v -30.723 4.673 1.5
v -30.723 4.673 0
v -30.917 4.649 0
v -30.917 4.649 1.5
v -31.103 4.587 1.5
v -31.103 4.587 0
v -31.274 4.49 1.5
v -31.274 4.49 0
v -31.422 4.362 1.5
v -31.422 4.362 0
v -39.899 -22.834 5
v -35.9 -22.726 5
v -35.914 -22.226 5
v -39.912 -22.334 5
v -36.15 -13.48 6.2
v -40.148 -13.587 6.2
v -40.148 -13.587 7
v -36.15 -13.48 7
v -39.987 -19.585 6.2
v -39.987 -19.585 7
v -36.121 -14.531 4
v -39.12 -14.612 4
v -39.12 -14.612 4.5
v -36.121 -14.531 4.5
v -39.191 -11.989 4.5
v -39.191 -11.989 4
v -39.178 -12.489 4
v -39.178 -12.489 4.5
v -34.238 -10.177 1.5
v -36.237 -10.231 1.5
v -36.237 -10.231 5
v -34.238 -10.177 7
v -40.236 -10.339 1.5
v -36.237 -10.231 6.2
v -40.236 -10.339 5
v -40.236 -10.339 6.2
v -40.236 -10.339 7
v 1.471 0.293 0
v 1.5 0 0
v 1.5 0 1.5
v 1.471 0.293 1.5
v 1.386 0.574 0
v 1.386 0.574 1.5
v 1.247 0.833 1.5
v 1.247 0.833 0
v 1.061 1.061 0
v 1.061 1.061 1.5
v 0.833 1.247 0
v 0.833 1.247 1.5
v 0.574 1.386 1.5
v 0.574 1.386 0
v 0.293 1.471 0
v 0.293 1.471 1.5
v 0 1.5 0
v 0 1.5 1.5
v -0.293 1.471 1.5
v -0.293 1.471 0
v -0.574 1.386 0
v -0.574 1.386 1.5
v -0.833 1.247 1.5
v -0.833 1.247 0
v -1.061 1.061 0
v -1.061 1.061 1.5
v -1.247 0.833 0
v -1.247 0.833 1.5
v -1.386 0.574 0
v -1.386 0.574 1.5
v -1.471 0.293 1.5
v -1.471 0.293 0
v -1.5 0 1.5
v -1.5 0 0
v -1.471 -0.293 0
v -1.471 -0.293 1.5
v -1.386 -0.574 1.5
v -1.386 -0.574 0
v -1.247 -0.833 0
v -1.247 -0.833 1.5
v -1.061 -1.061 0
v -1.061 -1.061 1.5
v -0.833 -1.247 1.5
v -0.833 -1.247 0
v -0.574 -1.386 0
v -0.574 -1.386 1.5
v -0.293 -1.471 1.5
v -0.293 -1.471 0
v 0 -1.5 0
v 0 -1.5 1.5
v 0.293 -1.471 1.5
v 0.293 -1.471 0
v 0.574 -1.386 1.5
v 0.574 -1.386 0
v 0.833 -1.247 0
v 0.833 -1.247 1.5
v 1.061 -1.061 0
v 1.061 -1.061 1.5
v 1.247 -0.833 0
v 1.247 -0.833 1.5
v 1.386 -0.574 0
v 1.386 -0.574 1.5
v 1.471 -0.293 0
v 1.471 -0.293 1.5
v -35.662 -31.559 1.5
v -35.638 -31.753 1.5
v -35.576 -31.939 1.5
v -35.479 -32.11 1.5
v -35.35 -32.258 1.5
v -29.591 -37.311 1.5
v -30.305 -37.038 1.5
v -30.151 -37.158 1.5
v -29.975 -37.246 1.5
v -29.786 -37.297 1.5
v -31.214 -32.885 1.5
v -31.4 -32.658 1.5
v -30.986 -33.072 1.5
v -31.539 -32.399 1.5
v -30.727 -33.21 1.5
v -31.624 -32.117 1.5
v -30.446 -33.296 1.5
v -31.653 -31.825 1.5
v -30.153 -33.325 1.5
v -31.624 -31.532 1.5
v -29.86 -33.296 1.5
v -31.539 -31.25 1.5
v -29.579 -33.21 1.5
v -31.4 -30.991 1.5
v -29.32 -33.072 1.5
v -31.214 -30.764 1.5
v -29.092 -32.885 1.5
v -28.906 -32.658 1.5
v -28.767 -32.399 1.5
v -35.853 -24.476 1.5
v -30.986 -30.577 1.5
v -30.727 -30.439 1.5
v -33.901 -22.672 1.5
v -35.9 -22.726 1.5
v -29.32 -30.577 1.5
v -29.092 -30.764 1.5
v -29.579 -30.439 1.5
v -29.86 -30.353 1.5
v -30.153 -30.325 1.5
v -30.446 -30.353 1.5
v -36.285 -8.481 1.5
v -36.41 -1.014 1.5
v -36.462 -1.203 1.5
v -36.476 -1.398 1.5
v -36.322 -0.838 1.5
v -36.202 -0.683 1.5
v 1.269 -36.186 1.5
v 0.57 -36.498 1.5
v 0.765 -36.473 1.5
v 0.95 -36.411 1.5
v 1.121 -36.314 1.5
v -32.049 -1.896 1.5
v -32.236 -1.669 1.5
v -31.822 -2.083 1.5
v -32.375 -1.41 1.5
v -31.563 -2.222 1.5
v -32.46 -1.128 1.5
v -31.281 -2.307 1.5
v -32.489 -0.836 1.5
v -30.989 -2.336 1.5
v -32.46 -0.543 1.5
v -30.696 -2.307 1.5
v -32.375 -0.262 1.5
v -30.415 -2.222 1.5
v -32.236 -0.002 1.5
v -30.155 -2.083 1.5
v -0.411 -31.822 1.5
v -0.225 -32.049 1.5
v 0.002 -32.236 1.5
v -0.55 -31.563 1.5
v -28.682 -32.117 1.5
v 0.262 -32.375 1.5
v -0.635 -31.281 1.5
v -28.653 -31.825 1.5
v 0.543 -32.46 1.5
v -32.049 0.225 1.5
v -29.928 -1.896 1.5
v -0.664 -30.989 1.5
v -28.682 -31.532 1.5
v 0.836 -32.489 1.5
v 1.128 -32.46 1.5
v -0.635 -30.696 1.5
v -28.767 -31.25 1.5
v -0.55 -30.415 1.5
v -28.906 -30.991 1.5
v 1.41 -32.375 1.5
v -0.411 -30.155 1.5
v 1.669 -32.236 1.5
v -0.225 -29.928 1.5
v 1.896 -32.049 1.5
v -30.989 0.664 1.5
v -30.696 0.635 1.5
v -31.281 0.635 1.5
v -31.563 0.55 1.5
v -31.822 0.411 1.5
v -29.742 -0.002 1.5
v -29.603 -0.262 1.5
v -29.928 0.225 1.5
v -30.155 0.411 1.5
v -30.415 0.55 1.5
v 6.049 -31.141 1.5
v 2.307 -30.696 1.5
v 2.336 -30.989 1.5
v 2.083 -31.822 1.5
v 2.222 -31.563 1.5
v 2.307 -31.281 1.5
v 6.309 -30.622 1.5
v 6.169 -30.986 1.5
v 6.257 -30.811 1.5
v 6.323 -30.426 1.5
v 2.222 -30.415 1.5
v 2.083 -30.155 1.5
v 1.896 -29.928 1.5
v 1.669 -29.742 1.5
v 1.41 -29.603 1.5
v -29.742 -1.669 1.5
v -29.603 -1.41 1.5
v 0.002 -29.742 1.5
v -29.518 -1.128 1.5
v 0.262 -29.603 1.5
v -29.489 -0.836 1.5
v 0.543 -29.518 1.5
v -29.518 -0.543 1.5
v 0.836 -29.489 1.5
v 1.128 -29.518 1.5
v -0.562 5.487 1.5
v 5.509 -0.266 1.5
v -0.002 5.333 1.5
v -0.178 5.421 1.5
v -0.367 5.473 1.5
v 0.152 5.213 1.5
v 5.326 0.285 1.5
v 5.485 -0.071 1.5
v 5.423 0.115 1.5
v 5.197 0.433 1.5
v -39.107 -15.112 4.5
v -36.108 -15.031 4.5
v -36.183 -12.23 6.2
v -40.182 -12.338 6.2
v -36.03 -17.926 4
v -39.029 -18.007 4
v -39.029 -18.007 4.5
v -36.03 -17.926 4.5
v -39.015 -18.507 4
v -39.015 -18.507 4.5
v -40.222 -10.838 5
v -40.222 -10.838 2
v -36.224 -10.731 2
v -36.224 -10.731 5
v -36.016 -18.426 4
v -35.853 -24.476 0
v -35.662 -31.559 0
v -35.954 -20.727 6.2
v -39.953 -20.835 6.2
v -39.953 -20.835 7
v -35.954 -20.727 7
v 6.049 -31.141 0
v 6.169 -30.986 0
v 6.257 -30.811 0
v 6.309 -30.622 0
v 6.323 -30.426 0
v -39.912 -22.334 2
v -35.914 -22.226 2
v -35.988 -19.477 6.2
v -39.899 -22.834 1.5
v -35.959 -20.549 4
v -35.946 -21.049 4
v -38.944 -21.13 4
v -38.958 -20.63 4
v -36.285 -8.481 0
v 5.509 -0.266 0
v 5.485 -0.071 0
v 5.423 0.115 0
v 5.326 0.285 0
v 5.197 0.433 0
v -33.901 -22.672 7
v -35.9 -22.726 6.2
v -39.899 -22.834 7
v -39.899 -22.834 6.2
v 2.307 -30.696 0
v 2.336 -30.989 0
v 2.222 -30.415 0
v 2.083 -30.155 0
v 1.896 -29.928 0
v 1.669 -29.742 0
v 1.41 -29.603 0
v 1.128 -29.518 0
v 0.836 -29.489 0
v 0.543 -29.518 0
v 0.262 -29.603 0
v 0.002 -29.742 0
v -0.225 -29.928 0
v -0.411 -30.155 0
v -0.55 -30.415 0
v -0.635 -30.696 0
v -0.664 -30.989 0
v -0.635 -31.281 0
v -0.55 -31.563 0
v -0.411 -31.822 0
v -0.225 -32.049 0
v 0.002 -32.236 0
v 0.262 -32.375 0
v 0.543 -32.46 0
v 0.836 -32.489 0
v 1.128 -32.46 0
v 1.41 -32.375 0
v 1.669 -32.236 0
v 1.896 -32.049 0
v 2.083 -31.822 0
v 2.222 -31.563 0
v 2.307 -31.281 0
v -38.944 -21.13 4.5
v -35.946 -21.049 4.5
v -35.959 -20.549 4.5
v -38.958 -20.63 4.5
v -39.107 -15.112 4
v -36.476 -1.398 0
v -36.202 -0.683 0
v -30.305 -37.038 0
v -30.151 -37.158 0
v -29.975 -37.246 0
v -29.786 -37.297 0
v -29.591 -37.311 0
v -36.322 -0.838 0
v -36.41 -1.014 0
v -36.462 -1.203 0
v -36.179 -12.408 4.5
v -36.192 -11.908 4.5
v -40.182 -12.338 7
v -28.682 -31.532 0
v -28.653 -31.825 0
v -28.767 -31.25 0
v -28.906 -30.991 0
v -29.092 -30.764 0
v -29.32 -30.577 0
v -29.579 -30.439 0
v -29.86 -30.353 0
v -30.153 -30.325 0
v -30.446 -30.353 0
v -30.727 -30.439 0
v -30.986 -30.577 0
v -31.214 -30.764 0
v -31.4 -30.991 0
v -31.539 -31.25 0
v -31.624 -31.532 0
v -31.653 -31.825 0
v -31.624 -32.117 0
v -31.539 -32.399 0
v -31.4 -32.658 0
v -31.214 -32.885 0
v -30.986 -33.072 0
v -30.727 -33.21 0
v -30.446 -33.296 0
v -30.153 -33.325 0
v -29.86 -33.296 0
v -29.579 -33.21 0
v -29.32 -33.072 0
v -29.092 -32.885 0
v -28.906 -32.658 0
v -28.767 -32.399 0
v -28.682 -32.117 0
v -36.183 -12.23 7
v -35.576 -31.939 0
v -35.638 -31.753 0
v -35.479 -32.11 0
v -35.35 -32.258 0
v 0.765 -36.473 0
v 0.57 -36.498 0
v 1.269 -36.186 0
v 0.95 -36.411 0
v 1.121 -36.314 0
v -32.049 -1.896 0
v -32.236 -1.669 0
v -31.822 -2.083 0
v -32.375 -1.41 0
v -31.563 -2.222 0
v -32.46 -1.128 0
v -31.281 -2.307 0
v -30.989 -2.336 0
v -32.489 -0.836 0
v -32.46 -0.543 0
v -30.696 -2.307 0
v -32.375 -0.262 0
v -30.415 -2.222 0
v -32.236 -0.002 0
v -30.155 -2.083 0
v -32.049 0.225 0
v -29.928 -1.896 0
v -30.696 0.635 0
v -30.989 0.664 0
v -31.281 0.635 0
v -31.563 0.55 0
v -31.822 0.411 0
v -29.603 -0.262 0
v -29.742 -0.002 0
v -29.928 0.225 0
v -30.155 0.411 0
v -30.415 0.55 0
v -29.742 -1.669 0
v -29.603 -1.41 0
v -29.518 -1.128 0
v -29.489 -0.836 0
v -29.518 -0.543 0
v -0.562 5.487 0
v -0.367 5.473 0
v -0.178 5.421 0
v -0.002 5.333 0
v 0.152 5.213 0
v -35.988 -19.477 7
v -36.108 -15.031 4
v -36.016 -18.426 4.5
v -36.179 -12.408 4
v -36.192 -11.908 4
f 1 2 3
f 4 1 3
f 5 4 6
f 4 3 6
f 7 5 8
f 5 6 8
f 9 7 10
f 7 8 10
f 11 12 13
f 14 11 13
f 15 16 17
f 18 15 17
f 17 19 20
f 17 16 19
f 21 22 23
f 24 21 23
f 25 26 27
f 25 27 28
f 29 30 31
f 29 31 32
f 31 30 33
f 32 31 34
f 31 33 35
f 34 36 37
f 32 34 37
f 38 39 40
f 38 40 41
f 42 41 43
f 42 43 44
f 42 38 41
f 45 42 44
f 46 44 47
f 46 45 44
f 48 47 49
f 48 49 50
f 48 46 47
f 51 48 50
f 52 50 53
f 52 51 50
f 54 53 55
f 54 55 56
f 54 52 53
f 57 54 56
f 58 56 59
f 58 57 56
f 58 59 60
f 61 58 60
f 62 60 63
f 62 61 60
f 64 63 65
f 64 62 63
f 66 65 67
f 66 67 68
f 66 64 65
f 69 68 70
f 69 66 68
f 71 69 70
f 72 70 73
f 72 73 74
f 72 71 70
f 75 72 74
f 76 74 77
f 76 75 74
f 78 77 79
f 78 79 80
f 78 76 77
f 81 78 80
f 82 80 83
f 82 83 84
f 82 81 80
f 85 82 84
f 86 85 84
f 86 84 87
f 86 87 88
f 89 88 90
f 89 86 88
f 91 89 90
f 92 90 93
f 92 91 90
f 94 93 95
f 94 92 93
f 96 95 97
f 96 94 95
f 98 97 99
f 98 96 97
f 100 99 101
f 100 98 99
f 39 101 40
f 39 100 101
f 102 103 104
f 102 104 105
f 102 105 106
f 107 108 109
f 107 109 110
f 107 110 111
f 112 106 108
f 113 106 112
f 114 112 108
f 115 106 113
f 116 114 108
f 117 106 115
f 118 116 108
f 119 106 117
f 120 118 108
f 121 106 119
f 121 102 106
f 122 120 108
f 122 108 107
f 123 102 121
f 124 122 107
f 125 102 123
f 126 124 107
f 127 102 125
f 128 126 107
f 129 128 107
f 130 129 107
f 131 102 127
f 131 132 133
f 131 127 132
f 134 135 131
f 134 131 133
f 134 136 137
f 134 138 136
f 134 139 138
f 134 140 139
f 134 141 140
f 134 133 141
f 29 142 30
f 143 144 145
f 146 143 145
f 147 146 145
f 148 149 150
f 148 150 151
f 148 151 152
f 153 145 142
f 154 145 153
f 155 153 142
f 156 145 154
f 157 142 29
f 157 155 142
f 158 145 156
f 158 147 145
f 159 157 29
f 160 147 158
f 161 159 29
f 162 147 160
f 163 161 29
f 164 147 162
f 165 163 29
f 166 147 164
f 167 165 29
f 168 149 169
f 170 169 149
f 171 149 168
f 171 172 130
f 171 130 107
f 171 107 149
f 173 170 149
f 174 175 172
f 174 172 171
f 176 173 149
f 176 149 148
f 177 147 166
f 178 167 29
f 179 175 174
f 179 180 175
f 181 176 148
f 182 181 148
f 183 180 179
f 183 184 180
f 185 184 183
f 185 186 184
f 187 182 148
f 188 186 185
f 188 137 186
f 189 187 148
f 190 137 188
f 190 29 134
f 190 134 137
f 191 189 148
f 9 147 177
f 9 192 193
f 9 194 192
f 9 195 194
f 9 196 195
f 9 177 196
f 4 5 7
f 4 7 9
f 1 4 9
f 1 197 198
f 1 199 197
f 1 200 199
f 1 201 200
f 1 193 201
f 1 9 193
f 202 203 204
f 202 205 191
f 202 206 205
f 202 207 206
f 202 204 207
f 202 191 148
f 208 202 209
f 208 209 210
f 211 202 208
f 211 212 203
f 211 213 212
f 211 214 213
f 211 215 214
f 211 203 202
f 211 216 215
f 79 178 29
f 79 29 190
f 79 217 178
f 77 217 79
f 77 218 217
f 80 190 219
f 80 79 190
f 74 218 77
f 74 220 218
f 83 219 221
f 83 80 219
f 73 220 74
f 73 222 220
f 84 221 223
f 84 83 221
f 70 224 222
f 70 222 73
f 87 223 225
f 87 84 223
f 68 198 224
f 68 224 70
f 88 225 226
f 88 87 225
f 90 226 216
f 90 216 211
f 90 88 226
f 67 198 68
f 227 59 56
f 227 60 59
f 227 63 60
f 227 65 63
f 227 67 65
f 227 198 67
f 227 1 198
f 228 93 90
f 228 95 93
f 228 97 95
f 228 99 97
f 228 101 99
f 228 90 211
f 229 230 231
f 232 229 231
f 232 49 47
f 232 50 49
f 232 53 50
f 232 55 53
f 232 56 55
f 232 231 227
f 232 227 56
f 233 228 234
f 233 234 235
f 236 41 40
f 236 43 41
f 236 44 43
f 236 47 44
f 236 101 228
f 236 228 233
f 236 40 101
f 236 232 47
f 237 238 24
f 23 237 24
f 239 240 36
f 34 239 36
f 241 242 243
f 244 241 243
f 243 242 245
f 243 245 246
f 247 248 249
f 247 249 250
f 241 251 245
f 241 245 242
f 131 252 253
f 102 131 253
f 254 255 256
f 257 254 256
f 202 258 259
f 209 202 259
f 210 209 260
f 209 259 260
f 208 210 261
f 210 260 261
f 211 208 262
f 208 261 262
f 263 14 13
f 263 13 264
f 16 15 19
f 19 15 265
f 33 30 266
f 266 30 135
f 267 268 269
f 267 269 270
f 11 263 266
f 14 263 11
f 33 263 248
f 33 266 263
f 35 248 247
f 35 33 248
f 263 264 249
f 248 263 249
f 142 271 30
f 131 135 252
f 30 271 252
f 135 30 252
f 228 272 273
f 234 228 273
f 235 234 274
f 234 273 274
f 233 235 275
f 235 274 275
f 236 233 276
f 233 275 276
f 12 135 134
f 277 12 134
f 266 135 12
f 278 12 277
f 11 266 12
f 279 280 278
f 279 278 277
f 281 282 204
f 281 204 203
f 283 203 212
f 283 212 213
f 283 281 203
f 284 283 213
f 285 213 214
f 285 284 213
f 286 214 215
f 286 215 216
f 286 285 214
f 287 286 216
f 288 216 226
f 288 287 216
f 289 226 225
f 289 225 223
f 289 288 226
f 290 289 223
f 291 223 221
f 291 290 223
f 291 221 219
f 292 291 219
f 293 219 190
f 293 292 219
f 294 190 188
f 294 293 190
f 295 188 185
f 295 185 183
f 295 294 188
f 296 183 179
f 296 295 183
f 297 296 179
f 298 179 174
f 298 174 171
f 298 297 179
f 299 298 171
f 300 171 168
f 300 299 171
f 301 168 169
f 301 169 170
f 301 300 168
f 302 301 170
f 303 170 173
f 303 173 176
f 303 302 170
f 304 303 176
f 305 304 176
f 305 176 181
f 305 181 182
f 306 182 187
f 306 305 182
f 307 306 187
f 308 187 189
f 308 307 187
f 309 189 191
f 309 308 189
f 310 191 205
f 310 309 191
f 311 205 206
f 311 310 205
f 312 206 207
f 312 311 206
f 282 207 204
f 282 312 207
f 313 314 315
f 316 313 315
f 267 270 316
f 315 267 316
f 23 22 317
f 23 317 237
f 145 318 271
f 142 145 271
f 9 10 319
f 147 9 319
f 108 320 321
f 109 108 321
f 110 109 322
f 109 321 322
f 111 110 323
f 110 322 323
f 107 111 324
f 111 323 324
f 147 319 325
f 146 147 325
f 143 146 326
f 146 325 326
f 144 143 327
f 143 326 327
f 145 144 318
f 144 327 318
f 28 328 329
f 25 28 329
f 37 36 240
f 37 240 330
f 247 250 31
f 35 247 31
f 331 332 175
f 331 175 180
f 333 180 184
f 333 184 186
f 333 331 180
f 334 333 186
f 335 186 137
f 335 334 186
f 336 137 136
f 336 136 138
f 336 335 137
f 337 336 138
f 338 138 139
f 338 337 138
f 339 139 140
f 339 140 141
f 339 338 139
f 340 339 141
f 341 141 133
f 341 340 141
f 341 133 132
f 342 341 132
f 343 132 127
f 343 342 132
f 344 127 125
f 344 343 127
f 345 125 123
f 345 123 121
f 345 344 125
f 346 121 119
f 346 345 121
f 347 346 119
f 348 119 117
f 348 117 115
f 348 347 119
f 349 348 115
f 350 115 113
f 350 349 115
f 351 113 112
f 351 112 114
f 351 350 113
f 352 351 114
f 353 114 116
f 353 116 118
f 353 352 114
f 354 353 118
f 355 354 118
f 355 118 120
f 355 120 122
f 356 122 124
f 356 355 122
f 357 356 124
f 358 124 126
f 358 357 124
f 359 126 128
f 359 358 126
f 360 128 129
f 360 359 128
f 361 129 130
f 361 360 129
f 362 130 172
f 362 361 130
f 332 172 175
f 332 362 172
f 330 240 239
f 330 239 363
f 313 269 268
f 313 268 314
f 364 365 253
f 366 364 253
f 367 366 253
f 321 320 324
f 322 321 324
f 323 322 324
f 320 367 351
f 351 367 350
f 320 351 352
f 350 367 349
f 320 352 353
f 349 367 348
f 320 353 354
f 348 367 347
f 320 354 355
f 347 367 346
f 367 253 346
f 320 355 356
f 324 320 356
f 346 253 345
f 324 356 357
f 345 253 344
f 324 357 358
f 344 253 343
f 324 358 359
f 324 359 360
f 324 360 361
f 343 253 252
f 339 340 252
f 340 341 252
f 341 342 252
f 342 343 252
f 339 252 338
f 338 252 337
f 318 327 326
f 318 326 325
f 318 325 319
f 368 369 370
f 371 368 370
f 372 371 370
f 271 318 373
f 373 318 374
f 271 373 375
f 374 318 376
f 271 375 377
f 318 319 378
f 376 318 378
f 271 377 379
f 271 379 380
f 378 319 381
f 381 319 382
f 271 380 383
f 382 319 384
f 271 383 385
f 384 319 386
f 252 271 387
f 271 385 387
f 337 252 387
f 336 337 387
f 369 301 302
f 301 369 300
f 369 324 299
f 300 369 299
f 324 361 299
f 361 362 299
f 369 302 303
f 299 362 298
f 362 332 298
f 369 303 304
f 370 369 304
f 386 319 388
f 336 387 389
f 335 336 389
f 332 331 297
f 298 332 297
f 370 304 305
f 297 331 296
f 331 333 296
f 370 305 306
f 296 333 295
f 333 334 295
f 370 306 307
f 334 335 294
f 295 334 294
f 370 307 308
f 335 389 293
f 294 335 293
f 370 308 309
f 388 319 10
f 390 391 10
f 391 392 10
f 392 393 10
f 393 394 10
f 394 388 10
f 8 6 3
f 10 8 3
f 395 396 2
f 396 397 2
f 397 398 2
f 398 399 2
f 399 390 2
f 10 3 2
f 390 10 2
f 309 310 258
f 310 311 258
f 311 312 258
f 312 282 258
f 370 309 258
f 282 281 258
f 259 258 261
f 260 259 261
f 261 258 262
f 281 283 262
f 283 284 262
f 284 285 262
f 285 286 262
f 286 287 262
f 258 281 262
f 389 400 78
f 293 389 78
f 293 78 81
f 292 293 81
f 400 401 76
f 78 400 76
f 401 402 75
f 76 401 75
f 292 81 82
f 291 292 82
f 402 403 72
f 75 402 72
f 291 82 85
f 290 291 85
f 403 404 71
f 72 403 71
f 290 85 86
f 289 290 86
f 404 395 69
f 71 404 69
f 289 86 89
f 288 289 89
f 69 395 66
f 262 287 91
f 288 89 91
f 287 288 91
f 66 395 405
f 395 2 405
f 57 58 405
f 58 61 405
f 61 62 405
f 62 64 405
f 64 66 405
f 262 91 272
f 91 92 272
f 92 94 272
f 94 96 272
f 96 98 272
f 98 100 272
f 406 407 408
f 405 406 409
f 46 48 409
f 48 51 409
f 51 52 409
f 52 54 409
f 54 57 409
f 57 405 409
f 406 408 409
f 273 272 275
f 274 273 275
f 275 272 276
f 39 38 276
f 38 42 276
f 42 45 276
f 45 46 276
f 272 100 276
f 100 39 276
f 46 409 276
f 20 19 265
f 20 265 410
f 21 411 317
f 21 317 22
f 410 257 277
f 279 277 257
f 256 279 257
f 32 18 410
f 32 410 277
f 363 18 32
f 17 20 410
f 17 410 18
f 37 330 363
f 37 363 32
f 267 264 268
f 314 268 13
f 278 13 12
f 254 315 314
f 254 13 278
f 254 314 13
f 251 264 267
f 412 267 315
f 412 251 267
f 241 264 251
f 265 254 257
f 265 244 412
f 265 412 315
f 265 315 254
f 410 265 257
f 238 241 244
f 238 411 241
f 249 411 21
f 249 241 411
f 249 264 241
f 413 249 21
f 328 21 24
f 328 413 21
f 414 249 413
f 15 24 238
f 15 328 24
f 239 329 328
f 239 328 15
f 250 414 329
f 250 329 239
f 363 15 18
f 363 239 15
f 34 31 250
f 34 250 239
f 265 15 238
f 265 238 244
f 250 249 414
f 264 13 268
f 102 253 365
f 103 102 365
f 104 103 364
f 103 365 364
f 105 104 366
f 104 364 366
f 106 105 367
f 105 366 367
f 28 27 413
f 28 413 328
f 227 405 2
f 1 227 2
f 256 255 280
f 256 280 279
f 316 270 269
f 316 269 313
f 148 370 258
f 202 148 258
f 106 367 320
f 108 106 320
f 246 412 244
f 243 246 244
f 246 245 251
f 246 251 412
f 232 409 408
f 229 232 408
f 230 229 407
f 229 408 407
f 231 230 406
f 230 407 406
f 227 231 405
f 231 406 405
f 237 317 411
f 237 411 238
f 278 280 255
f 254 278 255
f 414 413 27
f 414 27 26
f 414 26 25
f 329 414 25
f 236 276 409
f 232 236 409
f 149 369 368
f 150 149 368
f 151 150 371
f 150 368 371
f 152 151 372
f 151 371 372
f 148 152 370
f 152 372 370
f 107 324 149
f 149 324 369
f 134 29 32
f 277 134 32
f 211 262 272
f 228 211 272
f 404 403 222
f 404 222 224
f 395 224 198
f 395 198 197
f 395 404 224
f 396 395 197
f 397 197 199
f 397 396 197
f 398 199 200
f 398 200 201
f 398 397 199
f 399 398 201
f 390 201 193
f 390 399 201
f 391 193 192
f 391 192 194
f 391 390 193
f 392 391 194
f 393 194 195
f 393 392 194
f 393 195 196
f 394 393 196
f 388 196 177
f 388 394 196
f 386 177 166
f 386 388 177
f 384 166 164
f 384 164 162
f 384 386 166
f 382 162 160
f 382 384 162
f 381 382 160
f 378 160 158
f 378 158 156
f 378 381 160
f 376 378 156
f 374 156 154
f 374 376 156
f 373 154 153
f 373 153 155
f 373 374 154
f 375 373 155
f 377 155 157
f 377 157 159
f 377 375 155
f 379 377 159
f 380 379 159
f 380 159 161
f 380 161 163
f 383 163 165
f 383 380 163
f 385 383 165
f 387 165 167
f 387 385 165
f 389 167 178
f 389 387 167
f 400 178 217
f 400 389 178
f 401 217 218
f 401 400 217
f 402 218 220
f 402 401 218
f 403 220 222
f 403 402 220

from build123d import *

# Parameters (mm, degrees)
SKETCH_1_R      = 1.5
EXTRUDE_1_DEPTH = 1.5
SKETCH_2_W      = 5.5
SKETCH_2_H      = 12.5
EXTRUDE_2_DEPTH = 2
SKETCH_3_W      = 0.8
SKETCH_3_H      = 2
SKETCH_3_H_2    = 3
EXTRUDE_3_DEPTH = 4
SKETCH_4_W      = 0.5
SKETCH_4_H      = 0.5
EXTRUDE_4_DEPTH = 3


with BuildPart() as part:
    # 草图1 → 凸台-拉伸1 (new body)
    with BuildSketch(Plane.XY):
        with BuildLine():
            Line((-36.284526135, -8.481342061), (-35.853153699, -24.475525936))
            Line((-35.853153699, -24.475525936), (-35.662115389, -31.558736635))
            ThreePointArc((-35.662115389, -31.558736635), (-35.575705149, -31.939228692), (-35.350264491, -32.257689749))
            Line((-35.350264491, -32.257689749), (-30.305346266, -37.037625939))
            ThreePointArc((-30.305346266, -37.037625939), (-29.975196486, -37.245573186), (-29.590599895, -37.31134854))
            Line((-29.590599895, -37.31134854), (0.570005378, -36.497899484))
            ThreePointArc((0.570005378, -36.497899484), (0.950497435, -36.411489244), (1.268958491, -36.186048586))
            Line((1.268958491, -36.186048586), (6.048894681, -31.141130361))
            ThreePointArc((6.048894681, -31.141130361), (6.256841928, -30.810980581), (6.322617283, -30.42638399))
            Line((6.322617283, -30.42638399), (5.509168227, -0.265778718))
            ThreePointArc((5.509168227, -0.265778718), (5.422757987, 0.114713339), (5.197317328, 0.433174396))
            Line((5.197317328, 0.433174396), (0.152399104, 5.213110586))
            ThreePointArc((0.152399104, 5.213110586), (-0.177750677, 5.421057833), (-0.562347267, 5.486833187))
            Line((-0.562347267, 5.486833187), (-30.72295254, 4.673384131))
            ThreePointArc((-30.72295254, 4.673384131), (-31.103444597, 4.586973891), (-31.421905653, 4.361533233))
            Line((-31.421905653, 4.361533233), (-36.201841843, -0.683384991))
            ThreePointArc((-36.201841843, -0.683384991), (-36.40978909, -1.013534772), (-36.475564445, -1.398131363))
            Line((-36.475564445, -1.398131363), (-36.284526135, -8.481342061))
        make_face()
        with Locations((-30.988731257, -0.835784095)):
            Circle(SKETCH_1_R, mode=Mode.SUBTRACT)
        Circle(SKETCH_1_R, mode=Mode.SUBTRACT)
        with Locations((0.835784095, -30.988731257)):
            Circle(SKETCH_1_R, mode=Mode.SUBTRACT)
        with Locations((-30.152947162, -31.824515353)):
            Circle(SKETCH_1_R, mode=Mode.SUBTRACT)
    extrude(amount=EXTRUDE_1_DEPTH)

    # 草图2 → 凸台-拉伸2 (add)
    with BuildSketch(Plane(origin=(-36.486731964, -0.98406837, 0), x_dir=(0, 0, 1), z_dir=(-0.9996364921756676, -0.026960777264883006, 0))):
        with Locations((4.25, -15.5)):
            Rectangle(SKETCH_2_W, SKETCH_2_H)
    extrude(amount=-EXTRUDE_2_DEPTH)

    # 草图3 → 凸台-拉伸3 (add)
    with BuildSketch(Plane(origin=(-36.486731964, -0.98406837, 0), x_dir=(0, 0, 1), z_dir=(-0.9996364921756676, -0.026960777264883006, 0))):
        Polygon((2, -21.25), (2, -15.5), (1.5, -15.5), (1.5, -21.75), (5, -21.75), (5, -21.25), align=None)
        Polygon((1.5, -15.5), (2, -15.5), (2, -9.75), (5, -9.75), (5, -9.25), (1.5, -9.25), align=None)
        with Locations((6.6, -20.75)):
            Rectangle(SKETCH_3_W, SKETCH_3_H)
        with Locations((6.6, -17)):
            Rectangle(SKETCH_3_W, SKETCH_3_H_2)
        with Locations((6.6, -14)):
            Rectangle(SKETCH_3_W, SKETCH_3_H_2)
        with Locations((6.6, -10.25)):
            Rectangle(SKETCH_3_W, SKETCH_3_H)
    extrude(amount=EXTRUDE_3_DEPTH)

    # 草图4 → 凸台-拉伸4 (add)
    with BuildSketch(Plane(origin=(-36.486731964, -0.98406837, 0), x_dir=(0, 0, 1), z_dir=(-0.9996364921756676, -0.026960777264883006, 0))):
        with Locations((4.25, -19.822060647)):
            Rectangle(SKETCH_4_W, SKETCH_4_H)
        with Locations((4.25, -17.198296527)):
            Rectangle(SKETCH_4_W, SKETCH_4_H)
        with Locations((4.25, -13.801703473)):
            Rectangle(SKETCH_4_W, SKETCH_4_H)
        with Locations((4.25, -11.177939353)):
            Rectangle(SKETCH_4_W, SKETCH_4_H)
    extrude(amount=EXTRUDE_4_DEPTH)


solid = part.part
